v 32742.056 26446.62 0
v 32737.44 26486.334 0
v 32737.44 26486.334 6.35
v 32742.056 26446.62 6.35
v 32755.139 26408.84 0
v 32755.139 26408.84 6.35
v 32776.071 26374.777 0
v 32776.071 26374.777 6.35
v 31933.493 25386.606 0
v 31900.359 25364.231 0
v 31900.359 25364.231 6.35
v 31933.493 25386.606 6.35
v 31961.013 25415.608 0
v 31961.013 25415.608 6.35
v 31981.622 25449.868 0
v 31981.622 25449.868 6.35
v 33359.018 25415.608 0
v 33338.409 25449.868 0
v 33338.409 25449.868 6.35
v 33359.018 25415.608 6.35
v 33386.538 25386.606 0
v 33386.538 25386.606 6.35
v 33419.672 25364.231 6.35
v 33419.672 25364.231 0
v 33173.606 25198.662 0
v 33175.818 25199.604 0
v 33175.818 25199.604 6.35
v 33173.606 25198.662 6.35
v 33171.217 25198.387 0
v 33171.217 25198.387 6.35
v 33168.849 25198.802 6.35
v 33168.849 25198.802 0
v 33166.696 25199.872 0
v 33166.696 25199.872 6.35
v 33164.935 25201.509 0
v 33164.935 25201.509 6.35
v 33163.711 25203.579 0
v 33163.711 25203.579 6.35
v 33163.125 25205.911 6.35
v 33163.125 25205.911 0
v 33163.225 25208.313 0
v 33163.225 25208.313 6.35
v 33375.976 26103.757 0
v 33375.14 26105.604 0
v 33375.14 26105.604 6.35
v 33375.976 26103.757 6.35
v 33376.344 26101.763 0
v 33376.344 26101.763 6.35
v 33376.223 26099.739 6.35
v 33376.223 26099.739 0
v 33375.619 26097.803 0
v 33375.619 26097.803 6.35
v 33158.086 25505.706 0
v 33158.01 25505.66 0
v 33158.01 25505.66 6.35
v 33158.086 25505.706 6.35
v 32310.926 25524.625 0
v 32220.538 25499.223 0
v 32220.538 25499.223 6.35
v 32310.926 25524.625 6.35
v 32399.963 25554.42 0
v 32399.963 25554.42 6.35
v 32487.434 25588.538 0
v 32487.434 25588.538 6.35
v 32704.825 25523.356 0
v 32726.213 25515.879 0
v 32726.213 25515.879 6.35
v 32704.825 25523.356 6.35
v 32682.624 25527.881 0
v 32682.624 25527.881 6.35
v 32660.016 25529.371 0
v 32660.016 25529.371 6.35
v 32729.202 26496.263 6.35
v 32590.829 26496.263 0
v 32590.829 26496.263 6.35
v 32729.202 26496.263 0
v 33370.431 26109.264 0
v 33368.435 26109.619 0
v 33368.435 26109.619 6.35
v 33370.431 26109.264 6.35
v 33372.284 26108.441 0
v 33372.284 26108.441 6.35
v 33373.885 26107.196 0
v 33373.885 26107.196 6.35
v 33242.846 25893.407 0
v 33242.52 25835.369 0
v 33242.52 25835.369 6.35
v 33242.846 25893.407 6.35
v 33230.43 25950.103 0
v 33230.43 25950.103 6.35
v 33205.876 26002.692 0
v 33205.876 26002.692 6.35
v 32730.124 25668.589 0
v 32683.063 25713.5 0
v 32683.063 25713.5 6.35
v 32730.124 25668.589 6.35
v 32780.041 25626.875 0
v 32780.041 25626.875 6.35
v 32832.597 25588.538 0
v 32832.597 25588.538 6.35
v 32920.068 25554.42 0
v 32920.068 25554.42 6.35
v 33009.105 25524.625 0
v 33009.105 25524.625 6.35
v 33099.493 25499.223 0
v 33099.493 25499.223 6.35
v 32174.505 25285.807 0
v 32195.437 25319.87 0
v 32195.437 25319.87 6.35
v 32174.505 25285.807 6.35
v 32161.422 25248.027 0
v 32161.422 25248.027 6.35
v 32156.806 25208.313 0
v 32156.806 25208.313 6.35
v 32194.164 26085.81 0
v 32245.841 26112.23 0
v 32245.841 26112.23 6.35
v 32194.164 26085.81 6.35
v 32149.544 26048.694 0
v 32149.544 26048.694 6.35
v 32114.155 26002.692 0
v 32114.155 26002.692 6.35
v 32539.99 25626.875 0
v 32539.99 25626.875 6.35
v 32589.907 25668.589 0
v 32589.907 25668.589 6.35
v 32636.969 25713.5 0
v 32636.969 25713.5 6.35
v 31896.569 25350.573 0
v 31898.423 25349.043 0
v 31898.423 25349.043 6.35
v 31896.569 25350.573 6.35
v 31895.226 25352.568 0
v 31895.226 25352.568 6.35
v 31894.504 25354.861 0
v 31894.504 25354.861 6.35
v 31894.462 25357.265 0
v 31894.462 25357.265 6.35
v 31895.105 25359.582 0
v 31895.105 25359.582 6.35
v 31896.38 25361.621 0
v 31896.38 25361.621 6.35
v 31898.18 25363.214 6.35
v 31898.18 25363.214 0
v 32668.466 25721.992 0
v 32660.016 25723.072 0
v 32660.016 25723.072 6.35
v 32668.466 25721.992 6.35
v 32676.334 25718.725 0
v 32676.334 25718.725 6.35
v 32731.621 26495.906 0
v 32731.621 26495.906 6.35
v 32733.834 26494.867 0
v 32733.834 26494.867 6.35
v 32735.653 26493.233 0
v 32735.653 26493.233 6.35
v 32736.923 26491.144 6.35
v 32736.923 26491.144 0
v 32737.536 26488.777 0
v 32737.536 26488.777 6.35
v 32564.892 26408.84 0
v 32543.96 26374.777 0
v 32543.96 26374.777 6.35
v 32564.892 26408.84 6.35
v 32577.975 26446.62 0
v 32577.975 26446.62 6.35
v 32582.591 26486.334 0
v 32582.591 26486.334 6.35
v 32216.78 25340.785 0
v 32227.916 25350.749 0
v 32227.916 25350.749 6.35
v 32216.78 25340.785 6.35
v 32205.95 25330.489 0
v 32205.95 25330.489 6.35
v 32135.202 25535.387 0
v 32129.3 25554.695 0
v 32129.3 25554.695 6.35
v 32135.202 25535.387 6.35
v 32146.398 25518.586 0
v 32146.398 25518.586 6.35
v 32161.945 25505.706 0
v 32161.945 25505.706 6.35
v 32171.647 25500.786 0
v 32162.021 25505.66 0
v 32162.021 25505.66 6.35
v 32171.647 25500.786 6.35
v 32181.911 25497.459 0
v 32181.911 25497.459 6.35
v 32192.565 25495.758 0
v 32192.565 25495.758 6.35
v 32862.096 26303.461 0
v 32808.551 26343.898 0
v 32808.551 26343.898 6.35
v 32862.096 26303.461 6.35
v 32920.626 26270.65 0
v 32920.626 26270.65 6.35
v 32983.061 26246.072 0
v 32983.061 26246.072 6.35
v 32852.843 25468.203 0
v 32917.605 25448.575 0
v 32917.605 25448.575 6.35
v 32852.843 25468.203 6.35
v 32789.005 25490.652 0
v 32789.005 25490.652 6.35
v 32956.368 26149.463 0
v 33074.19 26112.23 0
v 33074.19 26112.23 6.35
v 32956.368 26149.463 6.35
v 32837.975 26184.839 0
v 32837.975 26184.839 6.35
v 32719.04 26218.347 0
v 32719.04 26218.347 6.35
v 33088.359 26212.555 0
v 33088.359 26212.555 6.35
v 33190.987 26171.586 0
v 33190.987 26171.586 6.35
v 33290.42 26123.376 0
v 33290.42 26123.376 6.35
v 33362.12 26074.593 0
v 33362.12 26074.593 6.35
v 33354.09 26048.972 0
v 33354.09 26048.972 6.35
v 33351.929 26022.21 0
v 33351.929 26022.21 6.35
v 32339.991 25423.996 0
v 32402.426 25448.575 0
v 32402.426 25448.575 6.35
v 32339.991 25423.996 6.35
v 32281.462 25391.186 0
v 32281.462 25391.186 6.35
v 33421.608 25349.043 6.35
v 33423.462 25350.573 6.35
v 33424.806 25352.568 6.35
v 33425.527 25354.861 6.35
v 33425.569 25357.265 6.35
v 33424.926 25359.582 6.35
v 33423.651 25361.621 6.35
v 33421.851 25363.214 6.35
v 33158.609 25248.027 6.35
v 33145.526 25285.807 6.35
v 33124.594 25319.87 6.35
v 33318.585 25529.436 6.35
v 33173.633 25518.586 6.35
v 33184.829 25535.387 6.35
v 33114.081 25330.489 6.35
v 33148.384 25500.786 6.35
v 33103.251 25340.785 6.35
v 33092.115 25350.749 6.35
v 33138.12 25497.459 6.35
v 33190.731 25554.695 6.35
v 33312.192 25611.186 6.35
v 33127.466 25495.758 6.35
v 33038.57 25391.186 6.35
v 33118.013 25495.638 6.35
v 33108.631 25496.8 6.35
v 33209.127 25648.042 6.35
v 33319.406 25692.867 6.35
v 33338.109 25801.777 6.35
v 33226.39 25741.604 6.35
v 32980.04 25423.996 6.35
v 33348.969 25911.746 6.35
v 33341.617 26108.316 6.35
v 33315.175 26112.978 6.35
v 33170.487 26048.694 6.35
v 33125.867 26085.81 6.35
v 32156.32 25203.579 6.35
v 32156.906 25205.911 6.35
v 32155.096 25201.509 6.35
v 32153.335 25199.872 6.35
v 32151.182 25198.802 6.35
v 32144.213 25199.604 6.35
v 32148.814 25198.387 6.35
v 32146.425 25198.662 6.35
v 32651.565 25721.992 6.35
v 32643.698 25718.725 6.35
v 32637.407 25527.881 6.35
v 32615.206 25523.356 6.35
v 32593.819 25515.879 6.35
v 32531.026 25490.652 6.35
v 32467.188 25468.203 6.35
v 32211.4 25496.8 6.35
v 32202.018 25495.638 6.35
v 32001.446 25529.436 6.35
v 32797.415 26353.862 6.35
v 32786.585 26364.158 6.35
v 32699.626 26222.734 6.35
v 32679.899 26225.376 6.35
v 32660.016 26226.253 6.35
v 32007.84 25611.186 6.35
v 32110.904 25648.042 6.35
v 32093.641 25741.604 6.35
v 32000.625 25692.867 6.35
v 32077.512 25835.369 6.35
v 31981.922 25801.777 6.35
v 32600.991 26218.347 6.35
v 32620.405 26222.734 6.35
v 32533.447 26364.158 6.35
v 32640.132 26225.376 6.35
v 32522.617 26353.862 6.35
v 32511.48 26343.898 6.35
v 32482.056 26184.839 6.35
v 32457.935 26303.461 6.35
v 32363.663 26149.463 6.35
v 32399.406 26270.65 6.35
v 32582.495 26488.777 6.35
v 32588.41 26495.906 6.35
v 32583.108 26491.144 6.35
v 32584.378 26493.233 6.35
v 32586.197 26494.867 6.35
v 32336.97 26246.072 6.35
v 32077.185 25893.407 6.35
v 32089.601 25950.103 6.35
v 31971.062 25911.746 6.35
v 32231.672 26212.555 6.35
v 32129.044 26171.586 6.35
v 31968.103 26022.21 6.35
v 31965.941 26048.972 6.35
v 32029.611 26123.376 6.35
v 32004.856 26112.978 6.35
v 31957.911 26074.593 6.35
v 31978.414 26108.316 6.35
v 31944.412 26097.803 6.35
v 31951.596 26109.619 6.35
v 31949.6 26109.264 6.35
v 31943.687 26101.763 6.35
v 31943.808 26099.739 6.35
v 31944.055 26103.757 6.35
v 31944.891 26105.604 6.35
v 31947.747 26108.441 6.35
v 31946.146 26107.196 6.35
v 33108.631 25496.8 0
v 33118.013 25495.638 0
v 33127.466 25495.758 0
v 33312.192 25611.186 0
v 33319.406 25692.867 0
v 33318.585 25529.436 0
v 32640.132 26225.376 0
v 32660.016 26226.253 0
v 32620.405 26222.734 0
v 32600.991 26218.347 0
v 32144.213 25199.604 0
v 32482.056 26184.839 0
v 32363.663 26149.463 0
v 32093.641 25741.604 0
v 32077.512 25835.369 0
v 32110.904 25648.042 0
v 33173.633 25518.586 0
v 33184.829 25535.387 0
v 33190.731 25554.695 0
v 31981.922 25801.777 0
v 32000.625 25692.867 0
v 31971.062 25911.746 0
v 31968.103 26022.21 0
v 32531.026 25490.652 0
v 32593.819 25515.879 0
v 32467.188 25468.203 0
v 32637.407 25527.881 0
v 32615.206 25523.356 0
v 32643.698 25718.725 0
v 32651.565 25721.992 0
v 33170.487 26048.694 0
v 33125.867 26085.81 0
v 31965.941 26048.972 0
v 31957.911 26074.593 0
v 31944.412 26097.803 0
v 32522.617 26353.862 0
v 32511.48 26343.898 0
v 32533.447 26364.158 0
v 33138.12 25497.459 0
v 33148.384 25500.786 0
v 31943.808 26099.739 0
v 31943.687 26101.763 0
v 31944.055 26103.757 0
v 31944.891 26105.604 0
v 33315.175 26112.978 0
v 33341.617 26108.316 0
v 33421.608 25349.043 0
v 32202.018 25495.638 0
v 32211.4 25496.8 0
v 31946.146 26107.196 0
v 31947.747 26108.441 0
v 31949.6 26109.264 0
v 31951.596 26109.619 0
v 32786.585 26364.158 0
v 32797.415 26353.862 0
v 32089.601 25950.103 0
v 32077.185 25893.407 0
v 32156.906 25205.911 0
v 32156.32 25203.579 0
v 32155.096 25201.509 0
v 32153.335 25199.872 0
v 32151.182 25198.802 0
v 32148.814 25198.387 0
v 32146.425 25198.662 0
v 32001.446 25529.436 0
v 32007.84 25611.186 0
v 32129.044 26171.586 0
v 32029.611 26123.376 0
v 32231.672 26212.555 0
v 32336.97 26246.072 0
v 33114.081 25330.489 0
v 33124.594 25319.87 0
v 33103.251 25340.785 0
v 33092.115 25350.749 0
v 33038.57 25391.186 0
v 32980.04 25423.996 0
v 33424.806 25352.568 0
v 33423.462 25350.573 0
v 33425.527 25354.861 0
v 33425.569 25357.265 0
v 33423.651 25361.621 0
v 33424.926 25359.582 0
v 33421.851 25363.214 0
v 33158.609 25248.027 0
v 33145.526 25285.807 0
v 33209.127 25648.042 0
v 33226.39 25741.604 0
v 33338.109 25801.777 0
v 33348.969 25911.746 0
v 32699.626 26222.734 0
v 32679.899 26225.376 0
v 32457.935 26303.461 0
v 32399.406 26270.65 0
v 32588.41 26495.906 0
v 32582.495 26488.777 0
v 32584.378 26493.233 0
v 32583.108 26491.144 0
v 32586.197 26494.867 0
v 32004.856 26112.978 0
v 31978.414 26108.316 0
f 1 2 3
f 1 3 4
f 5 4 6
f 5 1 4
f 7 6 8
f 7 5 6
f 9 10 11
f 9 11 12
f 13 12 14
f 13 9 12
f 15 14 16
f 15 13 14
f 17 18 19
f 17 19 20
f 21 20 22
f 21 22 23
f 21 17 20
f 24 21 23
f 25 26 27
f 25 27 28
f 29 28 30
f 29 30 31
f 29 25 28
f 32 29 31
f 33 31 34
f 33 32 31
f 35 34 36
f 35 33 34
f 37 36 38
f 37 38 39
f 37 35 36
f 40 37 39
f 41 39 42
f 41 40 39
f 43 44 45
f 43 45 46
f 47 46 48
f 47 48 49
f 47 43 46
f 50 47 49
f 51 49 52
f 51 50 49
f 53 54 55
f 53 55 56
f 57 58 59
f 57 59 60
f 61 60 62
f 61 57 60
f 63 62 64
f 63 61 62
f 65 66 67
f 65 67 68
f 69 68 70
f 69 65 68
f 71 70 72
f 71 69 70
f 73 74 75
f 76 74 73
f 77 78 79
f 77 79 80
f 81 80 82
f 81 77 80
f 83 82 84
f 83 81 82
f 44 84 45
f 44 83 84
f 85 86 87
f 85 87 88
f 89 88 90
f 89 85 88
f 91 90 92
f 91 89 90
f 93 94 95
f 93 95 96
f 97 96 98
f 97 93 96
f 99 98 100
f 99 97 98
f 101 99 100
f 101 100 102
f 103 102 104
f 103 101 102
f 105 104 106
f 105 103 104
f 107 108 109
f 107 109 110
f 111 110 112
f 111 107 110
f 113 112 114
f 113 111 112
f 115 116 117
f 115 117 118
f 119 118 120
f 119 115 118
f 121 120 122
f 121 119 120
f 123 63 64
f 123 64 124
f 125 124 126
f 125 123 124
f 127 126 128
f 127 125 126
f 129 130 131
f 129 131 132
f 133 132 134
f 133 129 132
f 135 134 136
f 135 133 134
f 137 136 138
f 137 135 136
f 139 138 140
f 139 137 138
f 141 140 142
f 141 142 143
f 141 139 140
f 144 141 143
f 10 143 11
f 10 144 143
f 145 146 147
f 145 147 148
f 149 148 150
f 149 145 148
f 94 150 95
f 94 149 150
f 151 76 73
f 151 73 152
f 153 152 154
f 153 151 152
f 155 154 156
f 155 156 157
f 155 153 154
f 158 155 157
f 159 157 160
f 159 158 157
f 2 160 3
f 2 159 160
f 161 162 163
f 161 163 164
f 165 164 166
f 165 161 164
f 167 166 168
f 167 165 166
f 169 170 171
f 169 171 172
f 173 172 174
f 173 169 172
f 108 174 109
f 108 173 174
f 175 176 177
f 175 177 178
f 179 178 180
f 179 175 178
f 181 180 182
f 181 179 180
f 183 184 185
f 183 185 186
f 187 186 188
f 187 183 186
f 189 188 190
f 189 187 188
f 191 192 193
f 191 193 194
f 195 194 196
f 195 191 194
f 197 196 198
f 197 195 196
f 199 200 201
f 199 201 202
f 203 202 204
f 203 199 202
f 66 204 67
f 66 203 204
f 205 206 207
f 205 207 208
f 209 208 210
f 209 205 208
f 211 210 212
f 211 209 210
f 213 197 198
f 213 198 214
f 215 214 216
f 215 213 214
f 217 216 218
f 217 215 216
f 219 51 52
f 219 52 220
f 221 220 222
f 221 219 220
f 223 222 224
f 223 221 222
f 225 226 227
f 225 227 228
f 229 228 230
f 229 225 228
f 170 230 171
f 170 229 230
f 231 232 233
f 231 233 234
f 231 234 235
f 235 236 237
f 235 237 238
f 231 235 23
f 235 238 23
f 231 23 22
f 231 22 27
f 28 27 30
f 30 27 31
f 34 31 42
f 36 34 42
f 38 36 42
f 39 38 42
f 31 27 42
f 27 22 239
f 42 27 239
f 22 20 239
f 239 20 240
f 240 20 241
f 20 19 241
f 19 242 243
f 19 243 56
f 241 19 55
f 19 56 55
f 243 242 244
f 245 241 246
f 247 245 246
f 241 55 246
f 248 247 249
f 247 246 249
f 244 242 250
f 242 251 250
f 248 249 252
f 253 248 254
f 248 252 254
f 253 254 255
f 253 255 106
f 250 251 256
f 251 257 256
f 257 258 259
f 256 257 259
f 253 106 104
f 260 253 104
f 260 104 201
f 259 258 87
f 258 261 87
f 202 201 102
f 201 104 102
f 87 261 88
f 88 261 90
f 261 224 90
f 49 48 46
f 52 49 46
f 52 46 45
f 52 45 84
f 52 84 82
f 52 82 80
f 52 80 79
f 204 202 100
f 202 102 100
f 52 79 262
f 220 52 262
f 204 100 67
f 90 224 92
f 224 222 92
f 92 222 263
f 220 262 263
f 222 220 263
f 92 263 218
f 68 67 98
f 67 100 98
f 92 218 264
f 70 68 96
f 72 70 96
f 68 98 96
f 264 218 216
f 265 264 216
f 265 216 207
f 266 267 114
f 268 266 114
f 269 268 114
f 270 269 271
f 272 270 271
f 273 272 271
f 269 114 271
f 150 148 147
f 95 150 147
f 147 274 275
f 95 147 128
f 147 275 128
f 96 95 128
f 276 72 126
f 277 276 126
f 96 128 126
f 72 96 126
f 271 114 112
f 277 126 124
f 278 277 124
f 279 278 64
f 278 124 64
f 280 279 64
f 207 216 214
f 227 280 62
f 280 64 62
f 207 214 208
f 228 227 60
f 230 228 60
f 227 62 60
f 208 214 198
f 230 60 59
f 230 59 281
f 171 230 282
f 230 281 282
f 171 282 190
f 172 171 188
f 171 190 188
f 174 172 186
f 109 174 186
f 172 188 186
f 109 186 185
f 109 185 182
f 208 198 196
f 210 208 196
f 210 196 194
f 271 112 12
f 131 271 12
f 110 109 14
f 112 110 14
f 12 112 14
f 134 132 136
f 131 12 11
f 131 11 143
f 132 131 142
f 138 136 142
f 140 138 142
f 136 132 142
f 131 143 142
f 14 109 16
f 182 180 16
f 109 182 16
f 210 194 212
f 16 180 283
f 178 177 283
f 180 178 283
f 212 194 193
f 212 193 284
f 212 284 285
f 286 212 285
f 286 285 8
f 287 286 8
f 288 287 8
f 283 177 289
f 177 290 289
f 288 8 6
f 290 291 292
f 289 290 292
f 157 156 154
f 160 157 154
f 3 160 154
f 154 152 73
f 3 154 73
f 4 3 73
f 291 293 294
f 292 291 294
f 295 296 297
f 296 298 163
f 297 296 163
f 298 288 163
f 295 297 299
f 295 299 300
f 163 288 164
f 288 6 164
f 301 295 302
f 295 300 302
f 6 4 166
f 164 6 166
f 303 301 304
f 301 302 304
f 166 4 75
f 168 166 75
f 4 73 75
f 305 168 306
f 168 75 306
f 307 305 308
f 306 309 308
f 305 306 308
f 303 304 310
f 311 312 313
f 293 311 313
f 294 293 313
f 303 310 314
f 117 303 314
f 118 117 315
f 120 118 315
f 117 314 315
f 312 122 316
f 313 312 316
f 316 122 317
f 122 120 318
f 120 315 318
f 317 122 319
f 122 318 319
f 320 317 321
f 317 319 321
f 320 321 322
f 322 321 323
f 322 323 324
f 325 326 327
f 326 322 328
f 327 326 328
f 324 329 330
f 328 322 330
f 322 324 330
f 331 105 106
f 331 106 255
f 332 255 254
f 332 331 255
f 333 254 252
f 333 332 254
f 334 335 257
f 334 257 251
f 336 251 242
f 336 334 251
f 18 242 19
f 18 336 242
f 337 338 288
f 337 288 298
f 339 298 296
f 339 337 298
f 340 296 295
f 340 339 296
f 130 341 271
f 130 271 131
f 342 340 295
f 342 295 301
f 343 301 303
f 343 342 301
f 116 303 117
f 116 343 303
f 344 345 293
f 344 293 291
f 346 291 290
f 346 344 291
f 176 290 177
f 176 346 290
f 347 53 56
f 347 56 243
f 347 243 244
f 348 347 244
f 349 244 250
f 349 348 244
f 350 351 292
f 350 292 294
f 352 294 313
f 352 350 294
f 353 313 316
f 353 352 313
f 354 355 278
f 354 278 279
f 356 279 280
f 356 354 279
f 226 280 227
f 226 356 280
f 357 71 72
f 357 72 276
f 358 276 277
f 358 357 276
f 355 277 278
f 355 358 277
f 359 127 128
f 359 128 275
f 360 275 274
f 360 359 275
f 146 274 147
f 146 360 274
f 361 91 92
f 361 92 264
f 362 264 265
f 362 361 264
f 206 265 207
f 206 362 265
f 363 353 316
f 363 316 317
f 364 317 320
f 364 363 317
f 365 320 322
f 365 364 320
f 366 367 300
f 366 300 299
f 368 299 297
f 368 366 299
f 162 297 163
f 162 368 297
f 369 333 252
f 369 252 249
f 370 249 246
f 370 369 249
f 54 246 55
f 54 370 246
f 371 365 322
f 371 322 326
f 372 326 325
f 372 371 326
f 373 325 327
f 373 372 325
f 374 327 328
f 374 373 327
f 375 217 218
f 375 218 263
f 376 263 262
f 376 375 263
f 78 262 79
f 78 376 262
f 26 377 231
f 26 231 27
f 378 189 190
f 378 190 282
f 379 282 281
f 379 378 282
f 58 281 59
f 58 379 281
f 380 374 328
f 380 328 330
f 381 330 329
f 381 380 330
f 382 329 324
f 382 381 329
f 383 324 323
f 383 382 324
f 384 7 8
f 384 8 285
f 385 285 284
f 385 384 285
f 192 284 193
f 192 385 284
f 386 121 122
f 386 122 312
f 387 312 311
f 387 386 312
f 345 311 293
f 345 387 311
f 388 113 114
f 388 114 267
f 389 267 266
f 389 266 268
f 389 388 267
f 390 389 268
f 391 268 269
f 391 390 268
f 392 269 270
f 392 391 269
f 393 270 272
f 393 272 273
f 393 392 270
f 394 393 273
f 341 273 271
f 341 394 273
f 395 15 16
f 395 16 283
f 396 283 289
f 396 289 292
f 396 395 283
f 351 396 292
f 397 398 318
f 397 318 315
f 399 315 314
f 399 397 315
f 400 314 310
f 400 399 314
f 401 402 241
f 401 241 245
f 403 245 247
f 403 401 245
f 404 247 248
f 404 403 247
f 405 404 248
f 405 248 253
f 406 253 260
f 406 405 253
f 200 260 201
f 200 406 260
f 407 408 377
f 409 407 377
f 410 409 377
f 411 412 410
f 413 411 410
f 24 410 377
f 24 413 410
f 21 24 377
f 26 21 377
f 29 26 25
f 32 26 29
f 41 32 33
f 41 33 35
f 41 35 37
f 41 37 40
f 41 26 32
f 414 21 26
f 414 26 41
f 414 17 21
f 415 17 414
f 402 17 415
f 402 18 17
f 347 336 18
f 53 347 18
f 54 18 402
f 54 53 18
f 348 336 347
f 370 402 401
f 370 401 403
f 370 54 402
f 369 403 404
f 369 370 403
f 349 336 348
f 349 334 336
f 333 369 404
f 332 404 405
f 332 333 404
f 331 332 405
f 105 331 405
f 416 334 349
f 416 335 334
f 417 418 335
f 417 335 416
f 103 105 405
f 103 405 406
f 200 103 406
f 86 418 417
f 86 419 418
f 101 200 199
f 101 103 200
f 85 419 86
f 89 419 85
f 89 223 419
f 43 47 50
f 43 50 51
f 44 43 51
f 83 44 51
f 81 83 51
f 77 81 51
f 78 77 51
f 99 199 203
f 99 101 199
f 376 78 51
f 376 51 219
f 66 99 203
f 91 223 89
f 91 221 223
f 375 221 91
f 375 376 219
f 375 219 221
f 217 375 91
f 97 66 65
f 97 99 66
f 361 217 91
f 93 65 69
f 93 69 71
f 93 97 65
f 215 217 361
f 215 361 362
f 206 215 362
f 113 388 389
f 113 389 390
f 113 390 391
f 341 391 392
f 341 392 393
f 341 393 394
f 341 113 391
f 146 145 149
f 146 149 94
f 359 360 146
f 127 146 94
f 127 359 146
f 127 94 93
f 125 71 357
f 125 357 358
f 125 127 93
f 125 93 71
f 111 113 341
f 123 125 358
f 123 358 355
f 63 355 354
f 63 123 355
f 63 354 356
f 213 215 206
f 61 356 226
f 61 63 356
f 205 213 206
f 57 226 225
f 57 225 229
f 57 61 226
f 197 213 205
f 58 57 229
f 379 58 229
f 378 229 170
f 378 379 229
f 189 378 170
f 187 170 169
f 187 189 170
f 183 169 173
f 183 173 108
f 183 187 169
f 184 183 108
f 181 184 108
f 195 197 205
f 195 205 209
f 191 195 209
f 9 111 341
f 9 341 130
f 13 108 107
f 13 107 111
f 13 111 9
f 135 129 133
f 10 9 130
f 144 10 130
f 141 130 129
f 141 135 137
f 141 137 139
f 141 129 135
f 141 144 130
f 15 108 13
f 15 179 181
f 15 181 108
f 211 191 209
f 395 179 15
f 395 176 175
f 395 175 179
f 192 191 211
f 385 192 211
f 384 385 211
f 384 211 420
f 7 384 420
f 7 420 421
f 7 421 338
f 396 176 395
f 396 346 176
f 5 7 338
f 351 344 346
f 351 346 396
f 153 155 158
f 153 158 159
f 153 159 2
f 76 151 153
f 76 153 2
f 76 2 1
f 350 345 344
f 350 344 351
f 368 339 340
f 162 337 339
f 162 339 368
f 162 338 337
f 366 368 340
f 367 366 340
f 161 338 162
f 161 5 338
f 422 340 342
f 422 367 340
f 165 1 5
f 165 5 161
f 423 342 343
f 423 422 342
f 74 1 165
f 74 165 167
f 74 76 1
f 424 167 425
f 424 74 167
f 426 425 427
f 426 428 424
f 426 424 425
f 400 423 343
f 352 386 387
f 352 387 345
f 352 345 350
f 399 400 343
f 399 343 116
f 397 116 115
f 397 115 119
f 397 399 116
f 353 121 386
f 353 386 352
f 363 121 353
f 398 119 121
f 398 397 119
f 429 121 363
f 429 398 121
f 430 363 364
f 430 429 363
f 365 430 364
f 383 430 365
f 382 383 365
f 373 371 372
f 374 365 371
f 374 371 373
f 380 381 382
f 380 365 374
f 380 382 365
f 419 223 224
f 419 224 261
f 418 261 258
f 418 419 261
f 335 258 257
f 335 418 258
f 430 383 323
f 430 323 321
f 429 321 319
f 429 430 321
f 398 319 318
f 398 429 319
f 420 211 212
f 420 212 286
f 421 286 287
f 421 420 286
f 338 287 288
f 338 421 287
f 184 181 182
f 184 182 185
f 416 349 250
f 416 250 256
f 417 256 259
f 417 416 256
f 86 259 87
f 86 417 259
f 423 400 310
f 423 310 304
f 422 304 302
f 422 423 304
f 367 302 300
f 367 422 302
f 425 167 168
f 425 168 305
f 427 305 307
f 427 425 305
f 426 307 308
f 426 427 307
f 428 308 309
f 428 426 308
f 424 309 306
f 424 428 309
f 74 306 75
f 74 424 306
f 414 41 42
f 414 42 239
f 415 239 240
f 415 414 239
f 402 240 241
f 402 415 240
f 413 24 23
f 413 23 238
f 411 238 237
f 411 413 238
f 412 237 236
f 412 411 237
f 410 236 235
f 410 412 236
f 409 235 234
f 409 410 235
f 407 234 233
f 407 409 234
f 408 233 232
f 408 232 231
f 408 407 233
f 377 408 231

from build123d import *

# Parameters (mm, degrees)
BOSS_EXTRUDE1_DEPTH = 6.35


with BuildPart() as part:
    # Model → Boss-Extrude1 (new body)
    with BuildSketch(Plane.XY):
        with BuildLine():
            Line((31898.42286363, 25349.042544488), (32021.317821572, 25274.323174378))
            Line((32021.317821572, 25274.323174378), (32144.212779514, 25199.603804268))
            ThreePointArc((32144.212779514, 25199.603804268), (32153.335418666, 25199.871913635), (32156.80608396, 25208.312820585))
            ThreePointArc((32156.80608396, 25208.312820585), (32166.934550474, 25267.272799762), (32195.436643106, 25319.870287288))
            ThreePointArc((32195.436643106, 25319.870287288), (32211.326319487, 25335.678059434), (32227.916498791, 25350.749005866))
            ThreePointArc((32227.916498791, 25350.749005866), (32310.168795148, 25408.585953526), (32402.426345225, 25448.574667242))
            ThreePointArc((32402.426345225, 25448.574667242), (32499.230008667, 25479.077054216), (32593.818558867, 25515.878562856))
            ThreePointArc((32593.818558867, 25515.878562856), (32626.230367121, 25525.993933375), (32660.015563019, 25529.371295238))
            ThreePointArc((32660.015563019, 25529.371295238), (32693.800758918, 25525.993933375), (32726.212567172, 25515.878562856))
            ThreePointArc((32726.212567172, 25515.878562856), (32820.801117373, 25479.077054216), (32917.604780817, 25448.574667241))
            ThreePointArc((32917.604780817, 25448.574667241), (33009.862330892, 25408.585953526), (33092.114627248, 25350.749005866))
            ThreePointArc((33092.114627248, 25350.749005866), (33108.704806552, 25335.678059434), (33124.594482933, 25319.870287288))
            ThreePointArc((33124.594482933, 25319.870287288), (33153.096575565, 25267.272799762), (33163.225042079, 25208.312820585))
            ThreePointArc((33163.225042079, 25208.312820585), (33166.695707373, 25199.871913635), (33175.818346525, 25199.603804268))
            Line((33175.818346525, 25199.603804268), (33298.713304467, 25274.323174378))
            Line((33298.713304467, 25274.323174378), (33421.608262409, 25349.042544488))
            ThreePointArc((33421.608262409, 25349.042544488), (33425.568656461, 25357.265056675), (33419.672049026, 25364.231005892))
            ThreePointArc((33419.672049026, 25364.231005892), (33371.988421328, 25400.357680634), (33338.409358194, 25449.868401671))
            ThreePointArc((33338.409358194, 25449.868401671), (33313.689479446, 25570.177684815), (33319.405834276, 25692.867208832))
            ThreePointArc((33319.405834276, 25692.867208832), (33344.523884523, 25856.663875176), (33351.928568545, 26022.209744977))
            ThreePointArc((33351.928568545, 26022.209744977), (33357.389765533, 26062.007077803), (33375.619076587, 26097.802951743))
            ThreePointArc((33375.619076587, 26097.802951743), (33376.344425729, 26101.762571322), (33375.140233121, 26105.603748061))
            ThreePointArc((33375.140233121, 26105.603748061), (33372.284211734, 26108.440623176), (33368.435022132, 26109.618951649))
            ThreePointArc((33368.435022132, 26109.618951649), (33328.265776157, 26109.908866112), (33290.420159808, 26123.375925766))
            ThreePointArc((33290.420159808, 26123.375925766), (33140.039956563, 26192.989565418), (32983.06065556, 26246.072174717))
            ThreePointArc((32983.06065556, 26246.072174717), (32890.803105481, 26286.060888433), (32808.550809123, 26343.897836094))
            ThreePointArc((32808.550809123, 26343.897836094), (32791.960629818, 26358.968782526), (32776.070953438, 26374.776554672))
            ThreePointArc((32776.070953438, 26374.776554672), (32747.568860806, 26427.374042198), (32737.440394292, 26486.334021375))
            ThreePointArc((32737.440394292, 26486.334021375), (32735.652774311, 26493.233188238), (32729.201847174, 26496.262978274))
            Line((32729.201847174, 26496.262978274), (32660.015563019, 26496.262978274))
            Line((32660.015563019, 26496.262978274), (32590.829278865, 26496.262978274))
            ThreePointArc((32590.829278865, 26496.262978274), (32584.378351728, 26493.233188238), (32582.590731747, 26486.334021375))
            ThreePointArc((32582.590731747, 26486.334021375), (32572.462265233, 26427.374042198), (32543.960172601, 26374.776554672))
            ThreePointArc((32543.960172601, 26374.776554672), (32528.070496221, 26358.968782526), (32511.480316916, 26343.897836094))
            ThreePointArc((32511.480316916, 26343.897836094), (32429.228020558, 26286.060888433), (32336.970470479, 26246.072174717))
            ThreePointArc((32336.970470479, 26246.072174717), (32179.991169477, 26192.989565418), (32029.610966233, 26123.375925767))
            ThreePointArc((32029.610966233, 26123.375925767), (31991.765349883, 26109.908866112), (31951.596103907, 26109.618951649))
            ThreePointArc((31951.596103907, 26109.618951649), (31947.746914305, 26108.440623176), (31944.890892918, 26105.603748061))
            ThreePointArc((31944.890892918, 26105.603748061), (31943.68670031, 26101.762571322), (31944.412049452, 26097.802951743))
            ThreePointArc((31944.412049452, 26097.802951743), (31962.641360506, 26062.007077803), (31968.102557494, 26022.209744977))
            ThreePointArc((31968.102557494, 26022.209744977), (31975.507241516, 25856.663875176), (32000.625291763, 25692.867208832))
            ThreePointArc((32000.625291763, 25692.867208832), (32006.341646593, 25570.177684815), (31981.621767845, 25449.868401671))
            ThreePointArc((31981.621767845, 25449.868401671), (31948.042704711, 25400.357680634), (31900.359077013, 25364.231005892))
            ThreePointArc((31900.359077013, 25364.231005892), (31894.462469578, 25357.265056675), (31898.42286363, 25349.042544488))
        make_face()
        with BuildLine():
            Line((32162.020964729, 25505.660038211), (32161.945371032, 25505.705998708))
            ThreePointArc((32161.945371032, 25505.705998708), (32140.18746019, 25526.578681225), (32129.300144187, 25554.695258362))
            ThreePointArc((32129.300144187, 25554.695258362), (32102.130853739, 25694.796891925), (32077.511511077, 25835.369030123))
            ThreePointArc((32077.511511077, 25835.369030123), (32081.823540268, 25922.098711206), (32114.155190805, 26002.692107648))
            ThreePointArc((32114.155190805, 26002.692107648), (32170.826716382, 26068.487011443), (32245.841260727, 26112.230003031))
            ThreePointArc((32245.841260727, 26112.230003031), (32422.790125237, 26167.38397641), (32600.991121341, 26218.347359521))
            ThreePointArc((32600.991121341, 26218.347359521), (32630.238884468, 26224.274724699), (32660.015563019, 26226.253289931))
            ThreePointArc((32660.015563019, 26226.253289931), (32689.79224157, 26224.274724699), (32719.040004698, 26218.347359521))
            ThreePointArc((32719.040004698, 26218.347359521), (32897.241000802, 26167.38397641), (33074.189865311, 26112.230003031))
            ThreePointArc((33074.189865311, 26112.230003031), (33149.204409657, 26068.487011442), (33205.875935233, 26002.692107648))
            ThreePointArc((33205.875935233, 26002.692107648), (33238.20758577, 25922.098711206), (33242.519614962, 25835.369030123))
            ThreePointArc((33242.519614962, 25835.369030123), (33217.9002723, 25694.796891925), (33190.730981851, 25554.695258361))
            ThreePointArc((33190.730981851, 25554.695258361), (33179.843665848, 25526.578681224), (33158.085755006, 25505.705998708))
            Line((33158.085755006, 25505.705998708), (33158.010161449, 25505.660038295))
            ThreePointArc((33158.010161449, 25505.660038295), (33143.316900969, 25498.923547887), (33127.465891366, 25495.758472671))
            ThreePointArc((33127.465891366, 25495.758472671), (33113.302324791, 25496.059847259), (33099.49326847, 25499.223296059))
            ThreePointArc((33099.49326847, 25499.223296059), (32964.404231752, 25538.977287333), (32832.597057568, 25588.538325434))
            ThreePointArc((32832.597057568, 25588.538325434), (32754.7391258, 25647.320716043), (32683.062613492, 25713.500052457))
            ThreePointArc((32683.062613492, 25713.500052457), (32672.508818509, 25720.62082965), (32660.01556302, 25723.071671069))
            ThreePointArc((32660.01556302, 25723.071671069), (32647.52230753, 25720.62082965), (32636.968512547, 25713.500052457))
            ThreePointArc((32636.968512547, 25713.500052457), (32565.292000239, 25647.320716044), (32487.434068472, 25588.538325436))
            ThreePointArc((32487.434068472, 25588.538325436), (32355.626894288, 25538.977287334), (32220.537857569, 25499.223296059))
            ThreePointArc((32220.537857569, 25499.223296059), (32206.728801248, 25496.05984726), (32192.565234673, 25495.758472672))
            ThreePointArc((32192.565234673, 25495.758472672), (32176.714225147, 25498.923547863), (32162.020964729, 25505.660038211))
        make_face(mode=Mode.SUBTRACT)
    extrude(amount=BOSS_EXTRUDE1_DEPTH)


solid = part.part
